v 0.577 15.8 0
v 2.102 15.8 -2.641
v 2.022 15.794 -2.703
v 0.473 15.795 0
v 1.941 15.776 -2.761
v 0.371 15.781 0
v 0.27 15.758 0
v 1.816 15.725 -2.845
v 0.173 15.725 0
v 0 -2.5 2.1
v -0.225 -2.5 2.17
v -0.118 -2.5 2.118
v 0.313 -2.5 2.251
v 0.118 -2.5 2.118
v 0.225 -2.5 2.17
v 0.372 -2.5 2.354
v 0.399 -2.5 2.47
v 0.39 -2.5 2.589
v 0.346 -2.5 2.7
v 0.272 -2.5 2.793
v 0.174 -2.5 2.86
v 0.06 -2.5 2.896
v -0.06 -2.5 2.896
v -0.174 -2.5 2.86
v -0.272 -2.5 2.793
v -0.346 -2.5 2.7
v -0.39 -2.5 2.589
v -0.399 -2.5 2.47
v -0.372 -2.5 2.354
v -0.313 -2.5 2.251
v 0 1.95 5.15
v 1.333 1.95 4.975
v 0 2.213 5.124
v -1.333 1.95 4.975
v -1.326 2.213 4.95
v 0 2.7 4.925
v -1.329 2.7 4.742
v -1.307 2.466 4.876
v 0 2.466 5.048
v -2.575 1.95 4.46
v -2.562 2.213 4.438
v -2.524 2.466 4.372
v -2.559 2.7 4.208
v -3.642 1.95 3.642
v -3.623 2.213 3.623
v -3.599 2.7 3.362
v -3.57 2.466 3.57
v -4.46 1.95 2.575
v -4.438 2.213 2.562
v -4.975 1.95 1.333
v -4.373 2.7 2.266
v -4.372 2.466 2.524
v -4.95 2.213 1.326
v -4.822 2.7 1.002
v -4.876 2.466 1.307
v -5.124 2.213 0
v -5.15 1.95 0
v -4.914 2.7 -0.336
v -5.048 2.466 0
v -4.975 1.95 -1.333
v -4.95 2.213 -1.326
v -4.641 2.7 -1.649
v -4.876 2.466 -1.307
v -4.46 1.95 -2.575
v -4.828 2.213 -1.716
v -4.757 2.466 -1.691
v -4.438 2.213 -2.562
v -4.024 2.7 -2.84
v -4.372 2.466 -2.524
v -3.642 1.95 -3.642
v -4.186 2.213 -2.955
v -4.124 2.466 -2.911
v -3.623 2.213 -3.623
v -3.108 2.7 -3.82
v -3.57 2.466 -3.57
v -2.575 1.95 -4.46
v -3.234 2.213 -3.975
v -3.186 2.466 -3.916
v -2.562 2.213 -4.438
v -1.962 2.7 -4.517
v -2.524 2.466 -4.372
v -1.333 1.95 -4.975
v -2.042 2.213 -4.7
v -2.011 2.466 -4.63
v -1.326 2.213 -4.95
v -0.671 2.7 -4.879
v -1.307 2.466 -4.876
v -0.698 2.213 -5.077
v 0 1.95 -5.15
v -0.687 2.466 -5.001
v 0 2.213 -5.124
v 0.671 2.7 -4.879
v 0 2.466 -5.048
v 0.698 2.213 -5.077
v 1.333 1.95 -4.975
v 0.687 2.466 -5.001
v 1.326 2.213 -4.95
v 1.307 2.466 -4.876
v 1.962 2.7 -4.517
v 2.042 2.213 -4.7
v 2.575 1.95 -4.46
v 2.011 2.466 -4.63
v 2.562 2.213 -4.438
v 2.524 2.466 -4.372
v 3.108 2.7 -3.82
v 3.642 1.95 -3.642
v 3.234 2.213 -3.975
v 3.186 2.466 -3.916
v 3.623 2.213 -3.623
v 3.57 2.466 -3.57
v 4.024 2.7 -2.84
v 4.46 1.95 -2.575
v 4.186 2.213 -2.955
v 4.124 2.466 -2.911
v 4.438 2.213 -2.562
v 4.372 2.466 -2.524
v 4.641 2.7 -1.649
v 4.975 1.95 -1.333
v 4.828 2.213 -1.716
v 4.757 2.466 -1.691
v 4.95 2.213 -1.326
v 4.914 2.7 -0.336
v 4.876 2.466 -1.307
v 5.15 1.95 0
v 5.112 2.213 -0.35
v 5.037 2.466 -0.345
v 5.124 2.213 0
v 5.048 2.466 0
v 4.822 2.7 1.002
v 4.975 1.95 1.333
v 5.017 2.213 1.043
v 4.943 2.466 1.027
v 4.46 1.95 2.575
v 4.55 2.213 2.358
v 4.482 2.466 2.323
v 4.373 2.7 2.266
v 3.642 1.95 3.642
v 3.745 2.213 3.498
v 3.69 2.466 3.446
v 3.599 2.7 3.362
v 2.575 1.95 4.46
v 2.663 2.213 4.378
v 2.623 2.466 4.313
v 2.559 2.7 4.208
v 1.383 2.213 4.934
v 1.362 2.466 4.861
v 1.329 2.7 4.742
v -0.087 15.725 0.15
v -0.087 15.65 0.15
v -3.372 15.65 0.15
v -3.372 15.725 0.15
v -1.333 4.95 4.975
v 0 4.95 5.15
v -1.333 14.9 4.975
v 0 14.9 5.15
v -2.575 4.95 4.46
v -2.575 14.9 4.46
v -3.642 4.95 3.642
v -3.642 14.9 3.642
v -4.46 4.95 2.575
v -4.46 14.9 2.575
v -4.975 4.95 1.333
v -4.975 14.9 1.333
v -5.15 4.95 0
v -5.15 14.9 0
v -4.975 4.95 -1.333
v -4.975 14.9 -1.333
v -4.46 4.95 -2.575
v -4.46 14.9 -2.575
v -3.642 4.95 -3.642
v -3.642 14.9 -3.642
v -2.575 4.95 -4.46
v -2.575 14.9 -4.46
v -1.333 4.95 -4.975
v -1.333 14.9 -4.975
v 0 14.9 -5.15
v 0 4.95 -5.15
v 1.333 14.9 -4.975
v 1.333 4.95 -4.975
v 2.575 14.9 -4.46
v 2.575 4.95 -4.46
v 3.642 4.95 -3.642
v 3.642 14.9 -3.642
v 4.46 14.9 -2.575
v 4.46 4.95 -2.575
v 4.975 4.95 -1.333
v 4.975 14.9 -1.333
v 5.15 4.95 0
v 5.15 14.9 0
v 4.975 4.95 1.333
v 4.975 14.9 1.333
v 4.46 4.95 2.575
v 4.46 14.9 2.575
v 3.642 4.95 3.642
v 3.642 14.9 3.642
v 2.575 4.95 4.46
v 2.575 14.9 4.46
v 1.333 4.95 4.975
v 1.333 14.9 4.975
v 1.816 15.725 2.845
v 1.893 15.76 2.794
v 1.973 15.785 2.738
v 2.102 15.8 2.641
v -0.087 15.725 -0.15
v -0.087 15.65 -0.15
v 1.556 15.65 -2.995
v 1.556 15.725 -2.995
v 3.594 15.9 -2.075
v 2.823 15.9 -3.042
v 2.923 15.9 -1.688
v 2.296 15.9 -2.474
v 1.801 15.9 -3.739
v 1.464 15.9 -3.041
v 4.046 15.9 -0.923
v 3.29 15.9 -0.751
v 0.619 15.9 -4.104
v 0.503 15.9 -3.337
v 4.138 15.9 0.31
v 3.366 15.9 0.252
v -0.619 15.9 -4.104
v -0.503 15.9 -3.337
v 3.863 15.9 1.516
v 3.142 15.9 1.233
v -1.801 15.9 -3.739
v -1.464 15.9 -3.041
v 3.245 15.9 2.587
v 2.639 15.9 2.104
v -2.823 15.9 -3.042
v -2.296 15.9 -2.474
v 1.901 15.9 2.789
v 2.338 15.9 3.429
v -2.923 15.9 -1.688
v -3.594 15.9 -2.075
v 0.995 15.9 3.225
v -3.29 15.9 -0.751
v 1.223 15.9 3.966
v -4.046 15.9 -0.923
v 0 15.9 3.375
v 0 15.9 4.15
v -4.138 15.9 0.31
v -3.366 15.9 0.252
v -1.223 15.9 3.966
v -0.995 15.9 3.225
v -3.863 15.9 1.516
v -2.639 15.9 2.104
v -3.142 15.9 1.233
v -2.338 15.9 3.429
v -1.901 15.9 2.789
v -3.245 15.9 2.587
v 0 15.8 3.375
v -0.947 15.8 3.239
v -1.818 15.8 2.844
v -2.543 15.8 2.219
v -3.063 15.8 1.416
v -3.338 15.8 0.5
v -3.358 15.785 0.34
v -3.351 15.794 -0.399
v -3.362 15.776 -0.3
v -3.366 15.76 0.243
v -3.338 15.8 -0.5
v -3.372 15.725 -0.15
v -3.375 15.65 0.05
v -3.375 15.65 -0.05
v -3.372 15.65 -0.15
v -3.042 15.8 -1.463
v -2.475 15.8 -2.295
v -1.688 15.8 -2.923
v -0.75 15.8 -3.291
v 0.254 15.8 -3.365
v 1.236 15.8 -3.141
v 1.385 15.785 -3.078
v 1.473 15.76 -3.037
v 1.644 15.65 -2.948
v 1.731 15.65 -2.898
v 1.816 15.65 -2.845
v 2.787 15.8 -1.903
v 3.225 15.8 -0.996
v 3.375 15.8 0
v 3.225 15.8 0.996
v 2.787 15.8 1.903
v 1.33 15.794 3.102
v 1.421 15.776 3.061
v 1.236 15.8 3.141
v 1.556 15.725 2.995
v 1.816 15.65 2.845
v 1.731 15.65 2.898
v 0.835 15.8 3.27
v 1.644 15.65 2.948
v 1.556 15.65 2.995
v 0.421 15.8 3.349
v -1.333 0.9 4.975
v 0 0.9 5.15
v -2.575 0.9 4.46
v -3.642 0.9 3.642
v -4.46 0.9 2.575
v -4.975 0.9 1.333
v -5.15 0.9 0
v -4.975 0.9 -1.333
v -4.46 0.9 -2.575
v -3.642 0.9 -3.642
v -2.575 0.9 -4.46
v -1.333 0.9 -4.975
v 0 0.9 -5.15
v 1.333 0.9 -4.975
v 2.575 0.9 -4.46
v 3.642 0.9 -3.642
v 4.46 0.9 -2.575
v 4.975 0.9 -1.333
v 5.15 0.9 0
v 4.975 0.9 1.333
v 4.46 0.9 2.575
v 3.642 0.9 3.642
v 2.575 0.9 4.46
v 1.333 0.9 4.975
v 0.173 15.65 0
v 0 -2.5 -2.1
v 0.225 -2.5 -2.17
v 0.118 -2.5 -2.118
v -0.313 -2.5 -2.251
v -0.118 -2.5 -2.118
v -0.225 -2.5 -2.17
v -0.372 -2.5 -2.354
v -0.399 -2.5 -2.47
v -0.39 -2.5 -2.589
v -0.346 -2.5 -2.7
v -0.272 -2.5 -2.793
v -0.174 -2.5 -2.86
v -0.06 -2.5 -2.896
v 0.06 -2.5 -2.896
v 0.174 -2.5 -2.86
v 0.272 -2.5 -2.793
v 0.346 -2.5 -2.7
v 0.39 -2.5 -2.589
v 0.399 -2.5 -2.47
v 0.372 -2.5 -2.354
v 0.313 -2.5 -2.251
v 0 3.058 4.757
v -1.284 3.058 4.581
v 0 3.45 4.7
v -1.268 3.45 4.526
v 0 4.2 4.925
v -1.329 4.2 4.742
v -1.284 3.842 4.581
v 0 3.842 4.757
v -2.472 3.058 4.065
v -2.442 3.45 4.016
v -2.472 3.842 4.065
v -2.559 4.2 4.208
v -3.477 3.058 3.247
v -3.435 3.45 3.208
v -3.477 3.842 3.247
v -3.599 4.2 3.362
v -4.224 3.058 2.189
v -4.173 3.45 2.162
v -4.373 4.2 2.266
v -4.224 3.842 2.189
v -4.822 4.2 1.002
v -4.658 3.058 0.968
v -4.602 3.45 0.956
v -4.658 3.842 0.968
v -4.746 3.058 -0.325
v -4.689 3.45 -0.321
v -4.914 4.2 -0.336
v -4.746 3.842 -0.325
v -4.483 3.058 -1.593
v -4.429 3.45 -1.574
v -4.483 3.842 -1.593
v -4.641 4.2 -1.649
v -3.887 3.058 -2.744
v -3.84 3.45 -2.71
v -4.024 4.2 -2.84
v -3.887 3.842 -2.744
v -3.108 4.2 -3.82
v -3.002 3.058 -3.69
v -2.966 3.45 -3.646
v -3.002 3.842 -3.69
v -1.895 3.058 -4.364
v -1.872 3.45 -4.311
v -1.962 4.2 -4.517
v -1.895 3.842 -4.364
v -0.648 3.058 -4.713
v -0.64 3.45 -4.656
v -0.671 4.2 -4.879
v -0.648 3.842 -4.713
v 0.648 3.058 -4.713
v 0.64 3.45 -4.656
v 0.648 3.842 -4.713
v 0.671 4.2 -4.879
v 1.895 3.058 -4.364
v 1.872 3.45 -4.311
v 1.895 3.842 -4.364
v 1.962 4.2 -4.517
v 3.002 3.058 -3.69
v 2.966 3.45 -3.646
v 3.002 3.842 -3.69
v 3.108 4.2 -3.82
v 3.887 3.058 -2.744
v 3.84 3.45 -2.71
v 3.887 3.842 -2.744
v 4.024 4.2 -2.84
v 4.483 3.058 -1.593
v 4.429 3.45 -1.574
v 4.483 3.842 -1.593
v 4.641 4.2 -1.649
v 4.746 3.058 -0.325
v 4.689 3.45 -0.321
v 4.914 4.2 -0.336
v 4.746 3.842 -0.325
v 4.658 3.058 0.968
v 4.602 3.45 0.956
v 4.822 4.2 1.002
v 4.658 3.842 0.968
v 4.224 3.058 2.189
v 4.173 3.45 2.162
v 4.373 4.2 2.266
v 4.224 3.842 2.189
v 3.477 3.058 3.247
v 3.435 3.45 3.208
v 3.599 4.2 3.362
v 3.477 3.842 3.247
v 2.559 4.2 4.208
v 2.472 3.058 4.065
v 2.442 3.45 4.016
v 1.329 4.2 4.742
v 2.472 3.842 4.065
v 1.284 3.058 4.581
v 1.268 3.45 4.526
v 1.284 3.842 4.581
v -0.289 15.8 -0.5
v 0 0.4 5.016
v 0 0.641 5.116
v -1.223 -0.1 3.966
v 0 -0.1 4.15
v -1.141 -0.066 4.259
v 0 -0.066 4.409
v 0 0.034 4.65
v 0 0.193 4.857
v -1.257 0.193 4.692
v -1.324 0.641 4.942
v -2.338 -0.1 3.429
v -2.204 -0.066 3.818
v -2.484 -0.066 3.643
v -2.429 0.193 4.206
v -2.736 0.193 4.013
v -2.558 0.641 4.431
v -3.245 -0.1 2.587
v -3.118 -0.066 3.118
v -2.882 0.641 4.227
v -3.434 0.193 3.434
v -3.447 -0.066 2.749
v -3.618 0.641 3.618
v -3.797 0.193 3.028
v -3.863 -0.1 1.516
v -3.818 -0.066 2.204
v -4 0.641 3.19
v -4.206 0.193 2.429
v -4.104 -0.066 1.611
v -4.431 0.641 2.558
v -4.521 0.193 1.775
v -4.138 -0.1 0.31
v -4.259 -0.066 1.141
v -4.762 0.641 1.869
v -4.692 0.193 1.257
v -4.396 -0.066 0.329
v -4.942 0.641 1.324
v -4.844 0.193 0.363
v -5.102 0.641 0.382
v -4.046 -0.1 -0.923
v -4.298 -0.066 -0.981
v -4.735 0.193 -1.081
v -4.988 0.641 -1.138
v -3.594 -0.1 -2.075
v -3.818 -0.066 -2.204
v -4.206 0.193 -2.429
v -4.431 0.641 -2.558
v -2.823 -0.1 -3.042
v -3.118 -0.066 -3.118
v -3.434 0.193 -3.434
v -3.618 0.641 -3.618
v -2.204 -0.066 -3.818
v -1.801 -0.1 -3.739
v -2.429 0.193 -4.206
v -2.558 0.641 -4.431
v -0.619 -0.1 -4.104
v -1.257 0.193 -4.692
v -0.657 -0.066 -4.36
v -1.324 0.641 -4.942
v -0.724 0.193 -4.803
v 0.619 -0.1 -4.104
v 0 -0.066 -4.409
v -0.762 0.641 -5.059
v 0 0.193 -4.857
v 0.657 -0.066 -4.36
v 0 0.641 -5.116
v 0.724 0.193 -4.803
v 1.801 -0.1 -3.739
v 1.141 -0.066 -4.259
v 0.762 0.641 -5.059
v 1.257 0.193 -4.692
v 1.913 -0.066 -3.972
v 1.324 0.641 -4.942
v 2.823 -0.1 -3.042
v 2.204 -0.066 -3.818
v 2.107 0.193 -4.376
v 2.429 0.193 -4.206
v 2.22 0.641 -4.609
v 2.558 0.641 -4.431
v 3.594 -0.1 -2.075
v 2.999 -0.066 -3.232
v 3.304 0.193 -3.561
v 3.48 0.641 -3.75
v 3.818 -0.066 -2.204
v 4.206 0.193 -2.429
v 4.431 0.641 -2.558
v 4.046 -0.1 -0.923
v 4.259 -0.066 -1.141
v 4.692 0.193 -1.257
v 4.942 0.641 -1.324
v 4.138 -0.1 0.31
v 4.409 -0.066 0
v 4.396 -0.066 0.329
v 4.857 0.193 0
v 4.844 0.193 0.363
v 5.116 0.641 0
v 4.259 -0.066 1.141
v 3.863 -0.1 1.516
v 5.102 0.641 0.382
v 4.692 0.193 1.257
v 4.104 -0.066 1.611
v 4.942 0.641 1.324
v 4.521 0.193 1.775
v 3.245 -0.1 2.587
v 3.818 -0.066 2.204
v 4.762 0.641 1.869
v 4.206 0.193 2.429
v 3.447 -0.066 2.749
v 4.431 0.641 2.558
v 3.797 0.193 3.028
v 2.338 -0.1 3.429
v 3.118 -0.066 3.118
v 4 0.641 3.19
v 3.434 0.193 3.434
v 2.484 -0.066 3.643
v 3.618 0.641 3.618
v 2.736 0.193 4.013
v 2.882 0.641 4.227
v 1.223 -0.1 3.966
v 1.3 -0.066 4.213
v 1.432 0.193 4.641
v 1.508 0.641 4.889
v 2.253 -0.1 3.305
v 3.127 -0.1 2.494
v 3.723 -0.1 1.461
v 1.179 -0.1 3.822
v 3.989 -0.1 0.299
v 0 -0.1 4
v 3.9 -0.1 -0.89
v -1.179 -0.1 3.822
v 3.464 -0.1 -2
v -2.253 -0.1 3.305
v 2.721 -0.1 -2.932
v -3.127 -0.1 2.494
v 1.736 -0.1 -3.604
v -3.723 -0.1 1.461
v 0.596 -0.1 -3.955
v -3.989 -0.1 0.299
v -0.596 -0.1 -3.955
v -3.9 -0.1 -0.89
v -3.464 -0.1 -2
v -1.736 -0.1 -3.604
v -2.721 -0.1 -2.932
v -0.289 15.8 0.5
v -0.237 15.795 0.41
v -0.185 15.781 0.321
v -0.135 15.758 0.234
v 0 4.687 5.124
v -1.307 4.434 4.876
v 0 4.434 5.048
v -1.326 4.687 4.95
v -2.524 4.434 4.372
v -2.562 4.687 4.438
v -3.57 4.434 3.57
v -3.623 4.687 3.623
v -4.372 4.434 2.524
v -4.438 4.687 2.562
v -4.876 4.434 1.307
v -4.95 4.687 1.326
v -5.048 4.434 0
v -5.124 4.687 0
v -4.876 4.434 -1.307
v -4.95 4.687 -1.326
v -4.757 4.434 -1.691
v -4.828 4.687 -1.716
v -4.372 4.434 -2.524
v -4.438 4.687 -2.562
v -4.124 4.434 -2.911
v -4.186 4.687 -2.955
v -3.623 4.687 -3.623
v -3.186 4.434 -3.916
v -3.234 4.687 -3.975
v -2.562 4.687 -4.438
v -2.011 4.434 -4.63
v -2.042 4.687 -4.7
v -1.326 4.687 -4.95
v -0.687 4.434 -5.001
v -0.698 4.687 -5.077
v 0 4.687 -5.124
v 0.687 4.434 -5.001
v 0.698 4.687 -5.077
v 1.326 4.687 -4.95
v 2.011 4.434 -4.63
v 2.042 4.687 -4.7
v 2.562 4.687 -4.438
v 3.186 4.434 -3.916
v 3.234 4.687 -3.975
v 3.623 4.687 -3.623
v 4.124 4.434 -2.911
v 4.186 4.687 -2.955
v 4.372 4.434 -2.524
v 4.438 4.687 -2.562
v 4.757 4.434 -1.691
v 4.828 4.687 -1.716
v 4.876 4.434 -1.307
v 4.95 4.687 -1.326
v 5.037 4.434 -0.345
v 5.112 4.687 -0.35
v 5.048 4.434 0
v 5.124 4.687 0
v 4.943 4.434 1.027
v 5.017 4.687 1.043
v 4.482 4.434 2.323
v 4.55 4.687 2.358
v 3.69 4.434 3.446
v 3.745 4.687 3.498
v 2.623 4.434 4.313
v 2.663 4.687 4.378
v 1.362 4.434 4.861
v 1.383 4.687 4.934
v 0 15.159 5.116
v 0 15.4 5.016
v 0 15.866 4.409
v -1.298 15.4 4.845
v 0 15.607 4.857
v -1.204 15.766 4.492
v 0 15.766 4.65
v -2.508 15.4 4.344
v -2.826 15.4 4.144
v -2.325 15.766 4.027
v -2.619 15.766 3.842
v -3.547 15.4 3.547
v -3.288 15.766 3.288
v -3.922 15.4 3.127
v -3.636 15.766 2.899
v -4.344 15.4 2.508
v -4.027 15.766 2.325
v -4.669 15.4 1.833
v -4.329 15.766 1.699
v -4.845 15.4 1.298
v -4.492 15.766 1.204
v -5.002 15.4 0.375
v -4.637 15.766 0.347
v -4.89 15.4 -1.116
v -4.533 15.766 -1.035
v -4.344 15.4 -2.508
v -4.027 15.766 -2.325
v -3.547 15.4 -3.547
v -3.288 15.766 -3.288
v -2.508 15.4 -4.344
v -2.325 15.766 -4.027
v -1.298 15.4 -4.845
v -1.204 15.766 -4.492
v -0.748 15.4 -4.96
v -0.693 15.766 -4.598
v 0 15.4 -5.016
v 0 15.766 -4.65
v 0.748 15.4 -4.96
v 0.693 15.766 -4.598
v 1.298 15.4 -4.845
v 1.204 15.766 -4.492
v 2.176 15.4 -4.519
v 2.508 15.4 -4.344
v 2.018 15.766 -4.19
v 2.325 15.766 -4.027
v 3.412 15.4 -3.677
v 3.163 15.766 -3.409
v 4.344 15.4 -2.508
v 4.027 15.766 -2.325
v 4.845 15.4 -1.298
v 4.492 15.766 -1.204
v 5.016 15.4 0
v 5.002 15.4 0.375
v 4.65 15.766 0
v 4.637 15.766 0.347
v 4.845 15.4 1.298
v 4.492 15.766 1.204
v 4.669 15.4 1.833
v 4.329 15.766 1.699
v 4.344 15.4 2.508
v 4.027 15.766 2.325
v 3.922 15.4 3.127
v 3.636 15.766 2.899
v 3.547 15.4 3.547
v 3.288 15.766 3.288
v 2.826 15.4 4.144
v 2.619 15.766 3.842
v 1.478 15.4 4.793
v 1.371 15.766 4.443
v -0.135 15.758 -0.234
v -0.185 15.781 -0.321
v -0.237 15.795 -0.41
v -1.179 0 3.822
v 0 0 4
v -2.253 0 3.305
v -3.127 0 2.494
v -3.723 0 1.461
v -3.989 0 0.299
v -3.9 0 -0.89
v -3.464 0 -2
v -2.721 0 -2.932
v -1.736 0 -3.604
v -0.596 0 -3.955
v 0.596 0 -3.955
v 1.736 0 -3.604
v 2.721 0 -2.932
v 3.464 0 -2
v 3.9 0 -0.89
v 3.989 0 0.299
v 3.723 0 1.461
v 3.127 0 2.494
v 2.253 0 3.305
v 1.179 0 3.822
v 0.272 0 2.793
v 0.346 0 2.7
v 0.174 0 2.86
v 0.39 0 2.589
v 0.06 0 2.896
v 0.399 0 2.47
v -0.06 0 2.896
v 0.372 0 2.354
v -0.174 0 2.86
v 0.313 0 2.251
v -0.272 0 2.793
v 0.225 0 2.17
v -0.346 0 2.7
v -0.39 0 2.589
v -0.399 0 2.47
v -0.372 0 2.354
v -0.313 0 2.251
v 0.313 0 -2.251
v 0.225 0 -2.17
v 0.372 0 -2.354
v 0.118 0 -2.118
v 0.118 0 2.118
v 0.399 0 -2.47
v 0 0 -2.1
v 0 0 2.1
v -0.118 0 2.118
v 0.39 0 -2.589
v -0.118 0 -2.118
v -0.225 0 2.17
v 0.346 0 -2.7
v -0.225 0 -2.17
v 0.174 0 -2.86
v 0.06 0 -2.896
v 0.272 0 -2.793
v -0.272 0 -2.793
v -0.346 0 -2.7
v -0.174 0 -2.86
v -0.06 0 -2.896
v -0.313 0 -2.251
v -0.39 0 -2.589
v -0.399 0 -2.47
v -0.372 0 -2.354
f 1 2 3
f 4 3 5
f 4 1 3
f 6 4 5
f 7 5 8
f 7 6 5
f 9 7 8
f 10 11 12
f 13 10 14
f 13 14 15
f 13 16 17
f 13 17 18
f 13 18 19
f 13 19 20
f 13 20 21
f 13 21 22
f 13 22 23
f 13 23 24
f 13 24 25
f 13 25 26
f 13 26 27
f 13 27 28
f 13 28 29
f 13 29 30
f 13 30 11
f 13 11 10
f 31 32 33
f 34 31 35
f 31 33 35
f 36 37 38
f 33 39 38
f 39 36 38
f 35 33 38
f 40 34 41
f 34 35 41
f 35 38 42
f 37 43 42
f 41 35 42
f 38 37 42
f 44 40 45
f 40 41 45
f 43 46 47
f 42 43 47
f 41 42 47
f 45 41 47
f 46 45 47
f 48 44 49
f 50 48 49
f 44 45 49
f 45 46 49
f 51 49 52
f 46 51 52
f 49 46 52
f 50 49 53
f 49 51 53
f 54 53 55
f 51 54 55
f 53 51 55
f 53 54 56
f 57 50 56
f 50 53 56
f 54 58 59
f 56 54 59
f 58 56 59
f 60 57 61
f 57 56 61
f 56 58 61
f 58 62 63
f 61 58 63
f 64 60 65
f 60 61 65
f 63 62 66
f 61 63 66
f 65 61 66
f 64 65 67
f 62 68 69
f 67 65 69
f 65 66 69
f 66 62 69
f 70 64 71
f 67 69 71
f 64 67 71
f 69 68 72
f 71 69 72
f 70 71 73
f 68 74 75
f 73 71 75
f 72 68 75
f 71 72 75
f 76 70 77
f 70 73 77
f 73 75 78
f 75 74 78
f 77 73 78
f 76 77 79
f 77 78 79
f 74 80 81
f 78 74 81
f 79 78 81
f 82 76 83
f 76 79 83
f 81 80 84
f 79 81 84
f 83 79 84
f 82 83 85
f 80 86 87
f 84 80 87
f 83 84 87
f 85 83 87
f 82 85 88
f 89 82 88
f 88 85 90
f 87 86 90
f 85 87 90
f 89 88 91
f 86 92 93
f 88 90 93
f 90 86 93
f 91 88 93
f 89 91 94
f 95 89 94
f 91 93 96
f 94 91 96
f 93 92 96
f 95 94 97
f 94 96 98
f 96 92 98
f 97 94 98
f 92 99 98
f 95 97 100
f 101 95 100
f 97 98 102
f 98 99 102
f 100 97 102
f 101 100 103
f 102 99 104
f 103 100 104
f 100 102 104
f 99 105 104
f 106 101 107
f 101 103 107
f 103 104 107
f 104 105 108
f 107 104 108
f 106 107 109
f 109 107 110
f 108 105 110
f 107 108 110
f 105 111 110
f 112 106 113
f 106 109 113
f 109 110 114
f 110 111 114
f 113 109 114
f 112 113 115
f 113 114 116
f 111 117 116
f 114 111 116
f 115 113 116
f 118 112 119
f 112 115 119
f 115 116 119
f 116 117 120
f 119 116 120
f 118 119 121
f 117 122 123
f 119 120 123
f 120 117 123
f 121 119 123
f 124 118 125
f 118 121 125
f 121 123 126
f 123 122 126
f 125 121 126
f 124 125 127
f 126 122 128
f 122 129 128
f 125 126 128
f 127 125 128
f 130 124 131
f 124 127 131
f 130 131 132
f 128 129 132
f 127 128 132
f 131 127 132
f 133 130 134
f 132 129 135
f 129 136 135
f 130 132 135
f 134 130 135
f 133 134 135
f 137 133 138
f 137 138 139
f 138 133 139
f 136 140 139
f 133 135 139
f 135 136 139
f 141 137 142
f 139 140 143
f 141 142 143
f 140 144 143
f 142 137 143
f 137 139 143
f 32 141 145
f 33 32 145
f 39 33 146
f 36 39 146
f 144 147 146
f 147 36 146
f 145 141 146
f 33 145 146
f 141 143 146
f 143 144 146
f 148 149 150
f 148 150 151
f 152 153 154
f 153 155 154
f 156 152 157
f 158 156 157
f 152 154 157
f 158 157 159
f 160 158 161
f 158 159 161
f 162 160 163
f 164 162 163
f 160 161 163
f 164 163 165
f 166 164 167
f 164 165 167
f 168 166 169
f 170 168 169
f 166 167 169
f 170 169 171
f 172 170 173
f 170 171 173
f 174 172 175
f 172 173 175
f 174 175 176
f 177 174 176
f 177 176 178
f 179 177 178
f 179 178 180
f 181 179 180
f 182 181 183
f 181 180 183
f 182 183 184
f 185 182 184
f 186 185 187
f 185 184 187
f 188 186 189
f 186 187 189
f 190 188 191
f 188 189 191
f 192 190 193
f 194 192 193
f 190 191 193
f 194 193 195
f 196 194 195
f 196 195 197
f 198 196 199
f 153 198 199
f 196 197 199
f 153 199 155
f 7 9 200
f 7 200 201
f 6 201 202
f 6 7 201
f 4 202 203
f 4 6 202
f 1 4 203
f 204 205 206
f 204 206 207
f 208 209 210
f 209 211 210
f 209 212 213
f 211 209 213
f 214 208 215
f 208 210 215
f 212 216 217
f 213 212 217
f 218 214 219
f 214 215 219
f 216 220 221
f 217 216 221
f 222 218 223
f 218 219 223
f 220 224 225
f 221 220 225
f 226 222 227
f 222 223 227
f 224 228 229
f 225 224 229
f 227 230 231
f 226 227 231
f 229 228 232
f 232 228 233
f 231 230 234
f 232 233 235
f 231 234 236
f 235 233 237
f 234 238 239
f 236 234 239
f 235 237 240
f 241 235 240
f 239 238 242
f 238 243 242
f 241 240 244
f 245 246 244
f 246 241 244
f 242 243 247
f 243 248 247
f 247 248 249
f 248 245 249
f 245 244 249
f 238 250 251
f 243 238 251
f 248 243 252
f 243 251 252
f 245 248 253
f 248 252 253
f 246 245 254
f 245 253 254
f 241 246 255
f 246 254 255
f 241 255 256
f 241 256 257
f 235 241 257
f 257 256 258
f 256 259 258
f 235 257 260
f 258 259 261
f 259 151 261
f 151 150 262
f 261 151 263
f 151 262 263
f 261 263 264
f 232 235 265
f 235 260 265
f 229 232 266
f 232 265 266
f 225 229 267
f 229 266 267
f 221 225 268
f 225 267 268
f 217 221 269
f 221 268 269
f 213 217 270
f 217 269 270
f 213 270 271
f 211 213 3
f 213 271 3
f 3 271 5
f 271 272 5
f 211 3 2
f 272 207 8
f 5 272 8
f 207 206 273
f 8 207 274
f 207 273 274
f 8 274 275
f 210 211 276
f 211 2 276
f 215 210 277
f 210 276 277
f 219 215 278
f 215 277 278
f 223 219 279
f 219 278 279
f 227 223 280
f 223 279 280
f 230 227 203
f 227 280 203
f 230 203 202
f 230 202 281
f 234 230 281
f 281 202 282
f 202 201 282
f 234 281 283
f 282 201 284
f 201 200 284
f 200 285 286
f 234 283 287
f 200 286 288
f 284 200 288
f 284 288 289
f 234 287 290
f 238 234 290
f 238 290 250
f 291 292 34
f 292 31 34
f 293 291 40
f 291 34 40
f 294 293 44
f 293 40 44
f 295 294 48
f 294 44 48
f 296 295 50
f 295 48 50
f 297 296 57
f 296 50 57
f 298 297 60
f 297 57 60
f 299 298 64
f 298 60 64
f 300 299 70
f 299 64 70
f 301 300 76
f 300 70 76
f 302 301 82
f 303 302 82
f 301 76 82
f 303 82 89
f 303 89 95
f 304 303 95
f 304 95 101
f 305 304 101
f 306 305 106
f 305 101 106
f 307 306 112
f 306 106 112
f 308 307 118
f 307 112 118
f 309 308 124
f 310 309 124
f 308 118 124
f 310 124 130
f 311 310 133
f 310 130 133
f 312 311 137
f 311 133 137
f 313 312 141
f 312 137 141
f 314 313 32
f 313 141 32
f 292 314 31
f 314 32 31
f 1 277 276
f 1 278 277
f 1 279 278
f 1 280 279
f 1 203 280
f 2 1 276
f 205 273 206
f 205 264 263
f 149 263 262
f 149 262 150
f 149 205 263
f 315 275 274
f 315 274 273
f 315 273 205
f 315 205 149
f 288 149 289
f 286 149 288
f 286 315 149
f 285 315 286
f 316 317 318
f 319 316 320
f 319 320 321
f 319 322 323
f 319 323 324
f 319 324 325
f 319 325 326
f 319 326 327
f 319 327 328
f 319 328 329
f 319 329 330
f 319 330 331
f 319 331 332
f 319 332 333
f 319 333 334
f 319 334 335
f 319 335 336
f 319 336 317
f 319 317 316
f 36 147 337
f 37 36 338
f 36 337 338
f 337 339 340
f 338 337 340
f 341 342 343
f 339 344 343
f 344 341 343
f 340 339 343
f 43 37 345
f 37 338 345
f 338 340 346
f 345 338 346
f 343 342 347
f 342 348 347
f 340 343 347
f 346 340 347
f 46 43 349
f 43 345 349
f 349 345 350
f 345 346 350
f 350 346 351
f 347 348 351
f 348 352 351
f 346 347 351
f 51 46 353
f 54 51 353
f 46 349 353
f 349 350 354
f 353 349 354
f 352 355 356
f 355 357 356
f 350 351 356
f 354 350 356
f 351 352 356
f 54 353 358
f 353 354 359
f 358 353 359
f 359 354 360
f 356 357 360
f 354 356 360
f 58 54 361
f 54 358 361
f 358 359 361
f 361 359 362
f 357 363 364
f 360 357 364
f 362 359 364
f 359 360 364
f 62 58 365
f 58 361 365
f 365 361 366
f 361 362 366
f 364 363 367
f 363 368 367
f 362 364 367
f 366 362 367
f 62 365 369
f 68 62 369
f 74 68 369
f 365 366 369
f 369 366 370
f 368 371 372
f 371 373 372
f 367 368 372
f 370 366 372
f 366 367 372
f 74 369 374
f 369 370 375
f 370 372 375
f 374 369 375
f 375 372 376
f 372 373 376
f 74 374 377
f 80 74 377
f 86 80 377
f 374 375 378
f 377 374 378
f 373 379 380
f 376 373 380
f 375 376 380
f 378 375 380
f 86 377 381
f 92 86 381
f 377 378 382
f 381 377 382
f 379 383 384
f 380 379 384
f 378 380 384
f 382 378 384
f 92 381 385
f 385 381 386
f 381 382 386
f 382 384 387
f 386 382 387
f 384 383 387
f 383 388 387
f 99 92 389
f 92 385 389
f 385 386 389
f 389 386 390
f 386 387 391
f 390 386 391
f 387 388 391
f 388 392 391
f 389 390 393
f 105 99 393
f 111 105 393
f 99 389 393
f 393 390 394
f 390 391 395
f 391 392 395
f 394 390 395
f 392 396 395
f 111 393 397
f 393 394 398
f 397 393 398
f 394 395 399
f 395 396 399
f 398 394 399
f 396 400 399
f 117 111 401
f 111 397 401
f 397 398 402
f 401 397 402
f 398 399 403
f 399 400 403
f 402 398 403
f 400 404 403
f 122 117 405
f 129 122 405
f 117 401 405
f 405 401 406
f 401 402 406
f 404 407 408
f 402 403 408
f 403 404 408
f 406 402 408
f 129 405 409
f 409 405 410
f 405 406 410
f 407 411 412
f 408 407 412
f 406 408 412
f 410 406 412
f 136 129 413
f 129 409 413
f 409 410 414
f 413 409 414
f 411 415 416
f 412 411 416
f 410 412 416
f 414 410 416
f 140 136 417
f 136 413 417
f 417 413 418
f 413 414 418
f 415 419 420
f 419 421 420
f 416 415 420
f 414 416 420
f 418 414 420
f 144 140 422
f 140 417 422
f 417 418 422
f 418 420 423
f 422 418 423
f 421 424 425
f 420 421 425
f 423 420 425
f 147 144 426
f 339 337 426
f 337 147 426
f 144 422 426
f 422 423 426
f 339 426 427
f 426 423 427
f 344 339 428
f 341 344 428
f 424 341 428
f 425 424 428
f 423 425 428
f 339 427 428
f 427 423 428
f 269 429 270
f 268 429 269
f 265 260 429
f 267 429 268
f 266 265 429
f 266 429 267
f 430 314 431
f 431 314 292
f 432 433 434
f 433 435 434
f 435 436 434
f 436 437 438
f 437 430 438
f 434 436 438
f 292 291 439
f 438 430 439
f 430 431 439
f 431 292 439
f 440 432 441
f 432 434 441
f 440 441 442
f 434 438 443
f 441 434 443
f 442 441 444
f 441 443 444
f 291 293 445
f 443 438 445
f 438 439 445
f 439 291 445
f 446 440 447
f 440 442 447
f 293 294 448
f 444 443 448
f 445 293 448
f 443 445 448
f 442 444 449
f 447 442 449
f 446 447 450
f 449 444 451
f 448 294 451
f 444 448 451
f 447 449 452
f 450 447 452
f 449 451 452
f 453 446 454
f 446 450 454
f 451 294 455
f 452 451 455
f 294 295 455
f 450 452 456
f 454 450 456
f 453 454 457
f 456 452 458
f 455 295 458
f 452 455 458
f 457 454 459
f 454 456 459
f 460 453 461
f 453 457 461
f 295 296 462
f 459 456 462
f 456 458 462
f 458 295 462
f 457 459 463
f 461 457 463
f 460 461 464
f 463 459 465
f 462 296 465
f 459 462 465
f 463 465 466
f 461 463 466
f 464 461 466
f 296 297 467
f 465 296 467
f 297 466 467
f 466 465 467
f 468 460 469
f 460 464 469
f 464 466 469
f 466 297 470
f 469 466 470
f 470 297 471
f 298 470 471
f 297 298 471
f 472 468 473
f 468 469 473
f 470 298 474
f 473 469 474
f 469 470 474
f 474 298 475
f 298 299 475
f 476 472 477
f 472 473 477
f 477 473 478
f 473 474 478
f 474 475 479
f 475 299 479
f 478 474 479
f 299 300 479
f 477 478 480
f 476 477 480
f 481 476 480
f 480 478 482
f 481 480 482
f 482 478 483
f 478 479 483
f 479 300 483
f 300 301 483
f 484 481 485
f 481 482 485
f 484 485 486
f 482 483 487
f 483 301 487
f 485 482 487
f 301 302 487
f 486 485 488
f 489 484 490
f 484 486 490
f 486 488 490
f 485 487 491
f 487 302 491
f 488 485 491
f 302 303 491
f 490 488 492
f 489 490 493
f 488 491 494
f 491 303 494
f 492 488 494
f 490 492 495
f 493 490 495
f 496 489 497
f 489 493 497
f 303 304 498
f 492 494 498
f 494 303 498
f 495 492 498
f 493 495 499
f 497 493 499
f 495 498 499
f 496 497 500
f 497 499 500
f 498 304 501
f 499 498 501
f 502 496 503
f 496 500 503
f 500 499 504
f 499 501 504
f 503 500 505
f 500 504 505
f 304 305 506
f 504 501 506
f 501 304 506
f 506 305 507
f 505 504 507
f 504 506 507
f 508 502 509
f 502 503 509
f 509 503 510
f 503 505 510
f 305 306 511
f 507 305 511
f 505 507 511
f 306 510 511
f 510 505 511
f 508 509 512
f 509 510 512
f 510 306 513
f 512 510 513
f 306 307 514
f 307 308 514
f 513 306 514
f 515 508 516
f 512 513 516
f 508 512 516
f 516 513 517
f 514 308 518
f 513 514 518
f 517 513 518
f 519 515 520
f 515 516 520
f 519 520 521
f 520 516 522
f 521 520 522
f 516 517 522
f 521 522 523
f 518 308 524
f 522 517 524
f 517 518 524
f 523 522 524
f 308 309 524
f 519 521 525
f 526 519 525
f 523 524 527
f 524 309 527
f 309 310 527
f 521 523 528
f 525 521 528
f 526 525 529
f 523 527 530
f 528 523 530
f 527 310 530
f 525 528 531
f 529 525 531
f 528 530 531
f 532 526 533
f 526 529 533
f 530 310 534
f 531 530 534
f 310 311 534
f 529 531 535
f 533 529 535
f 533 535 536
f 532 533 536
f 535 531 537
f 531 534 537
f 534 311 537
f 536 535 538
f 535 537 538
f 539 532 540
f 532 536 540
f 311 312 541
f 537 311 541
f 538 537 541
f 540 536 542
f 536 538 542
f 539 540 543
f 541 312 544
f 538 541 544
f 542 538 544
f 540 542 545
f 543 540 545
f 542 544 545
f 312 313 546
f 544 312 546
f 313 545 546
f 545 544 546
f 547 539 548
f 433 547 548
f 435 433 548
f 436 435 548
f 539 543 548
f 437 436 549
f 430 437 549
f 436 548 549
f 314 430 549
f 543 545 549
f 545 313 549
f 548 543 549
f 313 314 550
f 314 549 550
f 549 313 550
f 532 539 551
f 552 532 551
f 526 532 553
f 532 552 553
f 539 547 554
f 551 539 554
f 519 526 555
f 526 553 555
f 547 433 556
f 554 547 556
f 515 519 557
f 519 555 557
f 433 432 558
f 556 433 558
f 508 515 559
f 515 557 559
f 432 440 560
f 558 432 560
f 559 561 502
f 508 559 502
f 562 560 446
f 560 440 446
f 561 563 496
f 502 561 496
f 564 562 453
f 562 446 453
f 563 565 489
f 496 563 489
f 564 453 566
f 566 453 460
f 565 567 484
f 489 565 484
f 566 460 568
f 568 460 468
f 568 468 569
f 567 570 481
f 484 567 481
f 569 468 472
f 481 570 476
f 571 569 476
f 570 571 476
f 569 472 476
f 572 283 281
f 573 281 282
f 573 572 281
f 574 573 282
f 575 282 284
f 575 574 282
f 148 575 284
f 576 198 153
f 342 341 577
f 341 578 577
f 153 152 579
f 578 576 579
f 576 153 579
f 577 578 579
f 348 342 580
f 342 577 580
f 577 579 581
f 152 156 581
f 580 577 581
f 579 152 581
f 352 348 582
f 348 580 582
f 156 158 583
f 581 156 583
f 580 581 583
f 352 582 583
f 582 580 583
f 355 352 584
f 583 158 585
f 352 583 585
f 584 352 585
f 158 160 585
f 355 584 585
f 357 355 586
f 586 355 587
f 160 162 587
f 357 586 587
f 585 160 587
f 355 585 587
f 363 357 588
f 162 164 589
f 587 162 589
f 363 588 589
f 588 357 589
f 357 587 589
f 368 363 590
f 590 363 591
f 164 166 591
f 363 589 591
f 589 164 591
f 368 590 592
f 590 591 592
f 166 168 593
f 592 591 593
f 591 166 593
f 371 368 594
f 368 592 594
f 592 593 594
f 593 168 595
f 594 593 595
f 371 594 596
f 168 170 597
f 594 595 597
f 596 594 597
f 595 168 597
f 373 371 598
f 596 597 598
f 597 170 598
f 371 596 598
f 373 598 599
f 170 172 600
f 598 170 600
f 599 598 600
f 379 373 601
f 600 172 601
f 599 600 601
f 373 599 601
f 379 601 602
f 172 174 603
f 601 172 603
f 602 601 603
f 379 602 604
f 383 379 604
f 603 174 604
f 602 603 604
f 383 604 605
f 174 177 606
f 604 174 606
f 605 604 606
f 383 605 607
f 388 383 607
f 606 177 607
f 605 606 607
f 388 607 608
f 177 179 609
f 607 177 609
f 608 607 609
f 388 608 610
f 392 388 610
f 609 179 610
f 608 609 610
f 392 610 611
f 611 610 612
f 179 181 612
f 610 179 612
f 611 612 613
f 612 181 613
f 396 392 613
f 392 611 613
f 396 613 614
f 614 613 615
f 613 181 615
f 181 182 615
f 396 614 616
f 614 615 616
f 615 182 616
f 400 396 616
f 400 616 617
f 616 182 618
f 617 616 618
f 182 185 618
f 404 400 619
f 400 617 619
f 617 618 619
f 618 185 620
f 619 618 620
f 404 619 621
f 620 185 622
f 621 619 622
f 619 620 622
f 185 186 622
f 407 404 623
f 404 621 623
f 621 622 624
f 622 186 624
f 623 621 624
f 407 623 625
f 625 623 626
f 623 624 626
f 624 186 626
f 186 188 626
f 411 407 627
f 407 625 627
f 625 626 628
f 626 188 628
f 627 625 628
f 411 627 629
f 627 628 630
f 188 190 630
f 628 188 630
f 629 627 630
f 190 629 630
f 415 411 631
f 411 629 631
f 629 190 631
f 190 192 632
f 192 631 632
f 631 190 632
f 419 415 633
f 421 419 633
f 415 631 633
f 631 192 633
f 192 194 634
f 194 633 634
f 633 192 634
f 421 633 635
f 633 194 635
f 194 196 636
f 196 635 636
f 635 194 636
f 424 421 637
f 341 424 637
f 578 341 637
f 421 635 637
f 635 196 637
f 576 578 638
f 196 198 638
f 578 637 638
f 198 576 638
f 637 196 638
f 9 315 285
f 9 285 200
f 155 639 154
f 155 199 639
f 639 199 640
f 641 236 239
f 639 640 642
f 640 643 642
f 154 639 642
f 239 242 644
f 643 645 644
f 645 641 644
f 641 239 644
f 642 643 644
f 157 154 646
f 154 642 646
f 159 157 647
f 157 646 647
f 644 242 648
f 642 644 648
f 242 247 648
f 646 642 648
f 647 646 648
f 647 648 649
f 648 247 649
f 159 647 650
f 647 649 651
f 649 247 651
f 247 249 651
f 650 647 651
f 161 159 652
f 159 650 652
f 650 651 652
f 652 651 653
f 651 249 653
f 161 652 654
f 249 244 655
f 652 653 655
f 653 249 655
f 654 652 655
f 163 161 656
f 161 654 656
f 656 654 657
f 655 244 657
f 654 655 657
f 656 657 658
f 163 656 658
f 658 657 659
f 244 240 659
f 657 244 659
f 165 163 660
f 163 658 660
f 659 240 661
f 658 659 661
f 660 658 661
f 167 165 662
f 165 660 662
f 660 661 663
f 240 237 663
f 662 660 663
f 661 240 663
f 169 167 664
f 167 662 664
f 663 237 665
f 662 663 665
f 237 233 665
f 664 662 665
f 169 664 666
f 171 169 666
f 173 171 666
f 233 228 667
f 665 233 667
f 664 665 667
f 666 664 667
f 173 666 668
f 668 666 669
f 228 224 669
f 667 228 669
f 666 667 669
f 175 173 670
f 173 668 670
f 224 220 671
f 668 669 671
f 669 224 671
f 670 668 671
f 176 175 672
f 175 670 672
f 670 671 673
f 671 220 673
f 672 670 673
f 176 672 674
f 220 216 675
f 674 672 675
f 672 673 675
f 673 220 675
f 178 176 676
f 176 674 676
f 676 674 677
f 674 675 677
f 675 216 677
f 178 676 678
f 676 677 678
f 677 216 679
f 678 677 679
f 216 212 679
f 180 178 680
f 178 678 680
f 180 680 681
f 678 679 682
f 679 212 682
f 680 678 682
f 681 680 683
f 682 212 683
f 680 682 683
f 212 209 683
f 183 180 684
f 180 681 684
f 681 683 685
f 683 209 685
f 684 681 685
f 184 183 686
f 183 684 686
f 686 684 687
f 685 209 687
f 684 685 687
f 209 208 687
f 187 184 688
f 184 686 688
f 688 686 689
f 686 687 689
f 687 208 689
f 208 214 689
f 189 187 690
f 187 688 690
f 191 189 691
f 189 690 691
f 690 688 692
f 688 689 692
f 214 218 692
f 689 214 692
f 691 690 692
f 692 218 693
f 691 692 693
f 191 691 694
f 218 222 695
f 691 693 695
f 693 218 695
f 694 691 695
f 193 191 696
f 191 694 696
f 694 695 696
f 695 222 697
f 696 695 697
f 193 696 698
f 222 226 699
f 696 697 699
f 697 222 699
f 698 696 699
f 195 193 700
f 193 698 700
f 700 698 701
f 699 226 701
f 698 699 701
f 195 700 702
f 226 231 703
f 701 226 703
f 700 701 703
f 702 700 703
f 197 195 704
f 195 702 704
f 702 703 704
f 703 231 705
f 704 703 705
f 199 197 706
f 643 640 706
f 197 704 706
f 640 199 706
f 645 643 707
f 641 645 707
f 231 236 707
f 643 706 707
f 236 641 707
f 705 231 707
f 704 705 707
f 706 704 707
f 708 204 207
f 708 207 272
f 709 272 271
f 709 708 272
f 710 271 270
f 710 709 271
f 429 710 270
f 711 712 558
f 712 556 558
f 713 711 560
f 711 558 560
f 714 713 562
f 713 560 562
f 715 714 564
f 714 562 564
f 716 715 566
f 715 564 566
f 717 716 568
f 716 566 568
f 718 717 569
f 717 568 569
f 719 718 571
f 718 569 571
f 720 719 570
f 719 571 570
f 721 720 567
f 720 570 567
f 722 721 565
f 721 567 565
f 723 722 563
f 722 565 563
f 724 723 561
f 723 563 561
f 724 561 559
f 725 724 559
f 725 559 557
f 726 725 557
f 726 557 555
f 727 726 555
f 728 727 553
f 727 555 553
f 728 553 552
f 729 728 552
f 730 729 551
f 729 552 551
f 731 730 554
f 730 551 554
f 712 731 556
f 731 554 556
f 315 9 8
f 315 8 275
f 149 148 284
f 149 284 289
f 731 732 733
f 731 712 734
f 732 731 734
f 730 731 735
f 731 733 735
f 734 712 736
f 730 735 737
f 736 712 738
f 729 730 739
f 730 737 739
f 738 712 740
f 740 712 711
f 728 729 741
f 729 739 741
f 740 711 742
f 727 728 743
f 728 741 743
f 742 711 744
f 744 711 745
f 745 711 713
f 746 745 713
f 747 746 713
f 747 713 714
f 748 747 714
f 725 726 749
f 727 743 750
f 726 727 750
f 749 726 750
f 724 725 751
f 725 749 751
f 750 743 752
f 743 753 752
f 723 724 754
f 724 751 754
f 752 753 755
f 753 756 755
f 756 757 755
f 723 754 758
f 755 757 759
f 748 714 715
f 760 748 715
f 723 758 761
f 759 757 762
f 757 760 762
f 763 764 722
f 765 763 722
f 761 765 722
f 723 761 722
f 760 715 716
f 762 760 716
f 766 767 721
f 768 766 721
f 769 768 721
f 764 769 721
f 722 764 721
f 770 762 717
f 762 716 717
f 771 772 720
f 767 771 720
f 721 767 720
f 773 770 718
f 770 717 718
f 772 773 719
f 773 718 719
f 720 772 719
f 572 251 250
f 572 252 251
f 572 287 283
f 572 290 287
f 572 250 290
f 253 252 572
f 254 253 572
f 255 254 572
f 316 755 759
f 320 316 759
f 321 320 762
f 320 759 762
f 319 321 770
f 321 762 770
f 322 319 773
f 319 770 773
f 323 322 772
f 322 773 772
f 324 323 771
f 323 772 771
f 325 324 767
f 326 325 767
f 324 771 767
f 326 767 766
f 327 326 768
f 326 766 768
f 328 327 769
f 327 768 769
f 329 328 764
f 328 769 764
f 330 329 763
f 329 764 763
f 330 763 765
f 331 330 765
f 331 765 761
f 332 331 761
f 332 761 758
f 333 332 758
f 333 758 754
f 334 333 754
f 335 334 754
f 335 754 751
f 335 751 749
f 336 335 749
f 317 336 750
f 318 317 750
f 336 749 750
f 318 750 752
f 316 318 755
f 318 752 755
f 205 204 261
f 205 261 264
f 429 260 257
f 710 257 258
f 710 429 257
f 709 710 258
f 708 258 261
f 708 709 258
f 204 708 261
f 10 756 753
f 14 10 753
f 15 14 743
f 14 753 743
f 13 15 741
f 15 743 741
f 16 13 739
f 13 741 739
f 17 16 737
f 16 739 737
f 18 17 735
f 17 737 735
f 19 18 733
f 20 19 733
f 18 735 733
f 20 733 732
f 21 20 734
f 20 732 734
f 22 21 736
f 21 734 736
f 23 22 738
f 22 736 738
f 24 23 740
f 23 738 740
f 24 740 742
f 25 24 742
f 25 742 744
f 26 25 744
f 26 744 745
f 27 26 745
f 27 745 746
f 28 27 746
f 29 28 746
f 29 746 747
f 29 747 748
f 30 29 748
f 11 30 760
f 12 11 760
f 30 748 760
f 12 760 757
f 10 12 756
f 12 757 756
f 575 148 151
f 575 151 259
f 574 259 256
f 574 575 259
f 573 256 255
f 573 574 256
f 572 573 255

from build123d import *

# Parameters (mm, degrees)
SKETCH1_W           = 3.375
SKETCH1_H           = 1
CUT_EXTRUDE1_DEPTH  = 17.505188578
CIRPATTERN1_COUNT   = 3
SKETCH5_R           = 0.4
BOSS_EXTRUDE1_DEPTH = 2.5


with BuildPart() as part:
    # Sketch1 → Revolve1 (revolve)
    with BuildSketch(Plane(origin=(0, 0, 0), x_dir=(0, 0, -1), z_dir=(1, 0, 0))):
        with Locations((1.6875, 15.3)):
            Rectangle(SKETCH1_W, SKETCH1_H)
    revolve(axis=Axis((0, 33.37320456, 0), (0, -1, 0)))

    # Sketch2 → Cut-Extrude1 (cut, through all)
    with BuildSketch(Plane(origin=(0, 0, 0), x_dir=(0, 0, -1), z_dir=(1, 0, 0))):
        with BuildLine():
            Line((-0.5, 15.8), (0.5, 15.8))
            ThreePointArc((0.5, 15.8), (0.321027237, 15.781039562), (0.15, 15.725))
            Line((0.15, 15.725), (0.15, 15.65))
            Line((0.15, 15.65), (-0.15, 15.65))
            Line((-0.15, 15.65), (-0.15, 15.725))
            ThreePointArc((-0.15, 15.725), (-0.321027237, 15.781039562), (-0.5, 15.8))
        make_face()
    cut_extrude1 = extrude(amount=-CUT_EXTRUDE1_DEPTH, mode=Mode.SUBTRACT)

    # CirPattern1: Cut-Extrude1 ×3 about axis
    cirpattern1_axis = Axis((0, 33.37320456, 0), (0, 1, 0))
    for i in range(1, CIRPATTERN1_COUNT):
        add(cut_extrude1.rotate(cirpattern1_axis, i * 360 / CIRPATTERN1_COUNT), mode=Mode.SUBTRACT)

    # Sketch1<3> → Revolve2 (revolve)
    with BuildSketch(Plane(origin=(0, 0, 0), x_dir=(0, 0, -1), z_dir=(1, 0, 0))):
        with BuildLine():
            Line((3.375, 15.9), (3.375, 15.8))
            Line((3.375, 15.8), (3.375, 14.8))
            Line((3.375, 14.8), (0, 14.8))
            Line((0, 14.8), (0, 0))
            Line((0, 0), (4, 0))
            Line((4, 0), (4, -0.1))
            Line((4, -0.1), (4.15, -0.1))
            ThreePointArc((4.15, -0.1), (4.857106781, 0.192893219), (5.15, 0.9))
            Line((5.15, 0.9), (5.15, 1.95))
            ThreePointArc((5.15, 1.95), (5.092538314, 2.341511494), (4.925, 2.7))
            ThreePointArc((4.925, 2.7), (4.7, 3.45), (4.925, 4.2))
            ThreePointArc((4.925, 4.2), (5.092538314, 4.558488506), (5.15, 4.95))
            Line((5.15, 4.95), (5.15, 14.9))
            ThreePointArc((5.15, 14.9), (4.857106781, 15.607106781), (4.15, 15.9))
            Line((4.15, 15.9), (3.375, 15.9))
        make_face()
    revolve(axis=Axis((0, 33.37320456, 0), (0, -1, 0)))

    # Sketch5 → Boss-Extrude1 (add)
    with BuildSketch(Plane.XZ):
        with Locations((0, 2.5)):
            Circle(SKETCH5_R)
        with Locations((0, -2.5)):
            Circle(SKETCH5_R)
    extrude(amount=BOSS_EXTRUDE1_DEPTH)


solid = part.part
